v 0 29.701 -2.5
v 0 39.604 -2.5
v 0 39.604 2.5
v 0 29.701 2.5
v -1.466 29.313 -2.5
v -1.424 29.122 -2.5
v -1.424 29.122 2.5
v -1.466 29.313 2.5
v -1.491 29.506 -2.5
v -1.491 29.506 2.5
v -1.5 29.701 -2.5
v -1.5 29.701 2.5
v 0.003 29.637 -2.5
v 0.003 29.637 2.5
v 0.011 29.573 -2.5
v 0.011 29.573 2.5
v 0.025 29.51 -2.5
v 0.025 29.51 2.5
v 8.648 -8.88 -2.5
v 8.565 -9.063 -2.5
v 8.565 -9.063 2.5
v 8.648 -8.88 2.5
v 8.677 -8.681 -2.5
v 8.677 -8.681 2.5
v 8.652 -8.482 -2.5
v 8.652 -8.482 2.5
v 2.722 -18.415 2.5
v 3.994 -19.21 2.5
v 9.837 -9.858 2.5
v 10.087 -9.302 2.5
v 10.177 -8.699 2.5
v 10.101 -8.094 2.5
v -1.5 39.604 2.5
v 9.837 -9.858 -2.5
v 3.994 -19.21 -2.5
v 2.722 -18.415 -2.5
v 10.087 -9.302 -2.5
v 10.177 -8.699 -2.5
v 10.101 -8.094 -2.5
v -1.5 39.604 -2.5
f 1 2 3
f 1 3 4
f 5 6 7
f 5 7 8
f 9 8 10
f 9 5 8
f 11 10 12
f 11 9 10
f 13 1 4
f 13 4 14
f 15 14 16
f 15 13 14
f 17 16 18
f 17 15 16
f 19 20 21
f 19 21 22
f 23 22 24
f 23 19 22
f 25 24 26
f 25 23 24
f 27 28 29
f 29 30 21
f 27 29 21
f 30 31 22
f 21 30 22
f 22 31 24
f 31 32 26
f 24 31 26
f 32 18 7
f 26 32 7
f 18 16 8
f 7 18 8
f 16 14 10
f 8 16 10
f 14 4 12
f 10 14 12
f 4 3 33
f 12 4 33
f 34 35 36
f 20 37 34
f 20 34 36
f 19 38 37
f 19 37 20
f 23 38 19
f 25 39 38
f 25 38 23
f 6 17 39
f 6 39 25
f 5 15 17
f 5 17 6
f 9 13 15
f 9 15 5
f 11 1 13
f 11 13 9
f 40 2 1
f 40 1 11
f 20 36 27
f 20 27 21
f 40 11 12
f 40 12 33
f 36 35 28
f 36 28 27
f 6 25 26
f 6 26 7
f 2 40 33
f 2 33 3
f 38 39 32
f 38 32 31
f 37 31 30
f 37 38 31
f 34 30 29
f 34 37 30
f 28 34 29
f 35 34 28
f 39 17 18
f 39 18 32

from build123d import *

# Parameters (mm, degrees)
BASE_FLANGE1_DEPTH      = 2.5
BASE_FLANGE1_DEPTH_BACK = 2.5


# Sheet-metal steps are written as plain solids
with BuildPart() as part:
    # Sketch1 → Base-Flange1 (new, two sides: drawn at the far end of the back side and taken through both)
    with BuildSketch(Plane.XY.offset(-BASE_FLANGE1_DEPTH_BACK)):
        with BuildLine():
            Line((0, 39.604011434), (0, 29.700986664))
            ThreePointArc((0, 29.700986664), (0.006301715, 29.60484107), (0.025099036, 29.510340555))
            Line((0.025099036, 29.510340555), (10.101059931, -8.09365744))
            ThreePointArc((10.101059931, -8.09365744), (10.152703108, -9.003122645), (9.8374146, -9.857749543))
            Line((9.8374146, -9.857749543), (3.993730633, -19.209598772))
            Line((3.993730633, -19.209598772), (2.721658489, -18.414719875))
            Line((2.721658489, -18.414719875), (8.565342456, -9.062870646))
            ThreePointArc((8.565342456, -9.062870646), (8.669179313, -8.781408529), (8.652171192, -8.481886008))
            Line((8.652171192, -8.481886008), (-1.423789703, 29.122111987))
            ThreePointArc((-1.423789703, 29.122111987), (-1.480865577, 29.409051782), (-1.5, 29.700986664))
            Line((-1.5, 29.700986664), (-1.5, 39.604011434))
            Line((-1.5, 39.604011434), (0, 39.604011434))
        make_face()
    extrude(amount=BASE_FLANGE1_DEPTH + BASE_FLANGE1_DEPTH_BACK)


solid = part.part
